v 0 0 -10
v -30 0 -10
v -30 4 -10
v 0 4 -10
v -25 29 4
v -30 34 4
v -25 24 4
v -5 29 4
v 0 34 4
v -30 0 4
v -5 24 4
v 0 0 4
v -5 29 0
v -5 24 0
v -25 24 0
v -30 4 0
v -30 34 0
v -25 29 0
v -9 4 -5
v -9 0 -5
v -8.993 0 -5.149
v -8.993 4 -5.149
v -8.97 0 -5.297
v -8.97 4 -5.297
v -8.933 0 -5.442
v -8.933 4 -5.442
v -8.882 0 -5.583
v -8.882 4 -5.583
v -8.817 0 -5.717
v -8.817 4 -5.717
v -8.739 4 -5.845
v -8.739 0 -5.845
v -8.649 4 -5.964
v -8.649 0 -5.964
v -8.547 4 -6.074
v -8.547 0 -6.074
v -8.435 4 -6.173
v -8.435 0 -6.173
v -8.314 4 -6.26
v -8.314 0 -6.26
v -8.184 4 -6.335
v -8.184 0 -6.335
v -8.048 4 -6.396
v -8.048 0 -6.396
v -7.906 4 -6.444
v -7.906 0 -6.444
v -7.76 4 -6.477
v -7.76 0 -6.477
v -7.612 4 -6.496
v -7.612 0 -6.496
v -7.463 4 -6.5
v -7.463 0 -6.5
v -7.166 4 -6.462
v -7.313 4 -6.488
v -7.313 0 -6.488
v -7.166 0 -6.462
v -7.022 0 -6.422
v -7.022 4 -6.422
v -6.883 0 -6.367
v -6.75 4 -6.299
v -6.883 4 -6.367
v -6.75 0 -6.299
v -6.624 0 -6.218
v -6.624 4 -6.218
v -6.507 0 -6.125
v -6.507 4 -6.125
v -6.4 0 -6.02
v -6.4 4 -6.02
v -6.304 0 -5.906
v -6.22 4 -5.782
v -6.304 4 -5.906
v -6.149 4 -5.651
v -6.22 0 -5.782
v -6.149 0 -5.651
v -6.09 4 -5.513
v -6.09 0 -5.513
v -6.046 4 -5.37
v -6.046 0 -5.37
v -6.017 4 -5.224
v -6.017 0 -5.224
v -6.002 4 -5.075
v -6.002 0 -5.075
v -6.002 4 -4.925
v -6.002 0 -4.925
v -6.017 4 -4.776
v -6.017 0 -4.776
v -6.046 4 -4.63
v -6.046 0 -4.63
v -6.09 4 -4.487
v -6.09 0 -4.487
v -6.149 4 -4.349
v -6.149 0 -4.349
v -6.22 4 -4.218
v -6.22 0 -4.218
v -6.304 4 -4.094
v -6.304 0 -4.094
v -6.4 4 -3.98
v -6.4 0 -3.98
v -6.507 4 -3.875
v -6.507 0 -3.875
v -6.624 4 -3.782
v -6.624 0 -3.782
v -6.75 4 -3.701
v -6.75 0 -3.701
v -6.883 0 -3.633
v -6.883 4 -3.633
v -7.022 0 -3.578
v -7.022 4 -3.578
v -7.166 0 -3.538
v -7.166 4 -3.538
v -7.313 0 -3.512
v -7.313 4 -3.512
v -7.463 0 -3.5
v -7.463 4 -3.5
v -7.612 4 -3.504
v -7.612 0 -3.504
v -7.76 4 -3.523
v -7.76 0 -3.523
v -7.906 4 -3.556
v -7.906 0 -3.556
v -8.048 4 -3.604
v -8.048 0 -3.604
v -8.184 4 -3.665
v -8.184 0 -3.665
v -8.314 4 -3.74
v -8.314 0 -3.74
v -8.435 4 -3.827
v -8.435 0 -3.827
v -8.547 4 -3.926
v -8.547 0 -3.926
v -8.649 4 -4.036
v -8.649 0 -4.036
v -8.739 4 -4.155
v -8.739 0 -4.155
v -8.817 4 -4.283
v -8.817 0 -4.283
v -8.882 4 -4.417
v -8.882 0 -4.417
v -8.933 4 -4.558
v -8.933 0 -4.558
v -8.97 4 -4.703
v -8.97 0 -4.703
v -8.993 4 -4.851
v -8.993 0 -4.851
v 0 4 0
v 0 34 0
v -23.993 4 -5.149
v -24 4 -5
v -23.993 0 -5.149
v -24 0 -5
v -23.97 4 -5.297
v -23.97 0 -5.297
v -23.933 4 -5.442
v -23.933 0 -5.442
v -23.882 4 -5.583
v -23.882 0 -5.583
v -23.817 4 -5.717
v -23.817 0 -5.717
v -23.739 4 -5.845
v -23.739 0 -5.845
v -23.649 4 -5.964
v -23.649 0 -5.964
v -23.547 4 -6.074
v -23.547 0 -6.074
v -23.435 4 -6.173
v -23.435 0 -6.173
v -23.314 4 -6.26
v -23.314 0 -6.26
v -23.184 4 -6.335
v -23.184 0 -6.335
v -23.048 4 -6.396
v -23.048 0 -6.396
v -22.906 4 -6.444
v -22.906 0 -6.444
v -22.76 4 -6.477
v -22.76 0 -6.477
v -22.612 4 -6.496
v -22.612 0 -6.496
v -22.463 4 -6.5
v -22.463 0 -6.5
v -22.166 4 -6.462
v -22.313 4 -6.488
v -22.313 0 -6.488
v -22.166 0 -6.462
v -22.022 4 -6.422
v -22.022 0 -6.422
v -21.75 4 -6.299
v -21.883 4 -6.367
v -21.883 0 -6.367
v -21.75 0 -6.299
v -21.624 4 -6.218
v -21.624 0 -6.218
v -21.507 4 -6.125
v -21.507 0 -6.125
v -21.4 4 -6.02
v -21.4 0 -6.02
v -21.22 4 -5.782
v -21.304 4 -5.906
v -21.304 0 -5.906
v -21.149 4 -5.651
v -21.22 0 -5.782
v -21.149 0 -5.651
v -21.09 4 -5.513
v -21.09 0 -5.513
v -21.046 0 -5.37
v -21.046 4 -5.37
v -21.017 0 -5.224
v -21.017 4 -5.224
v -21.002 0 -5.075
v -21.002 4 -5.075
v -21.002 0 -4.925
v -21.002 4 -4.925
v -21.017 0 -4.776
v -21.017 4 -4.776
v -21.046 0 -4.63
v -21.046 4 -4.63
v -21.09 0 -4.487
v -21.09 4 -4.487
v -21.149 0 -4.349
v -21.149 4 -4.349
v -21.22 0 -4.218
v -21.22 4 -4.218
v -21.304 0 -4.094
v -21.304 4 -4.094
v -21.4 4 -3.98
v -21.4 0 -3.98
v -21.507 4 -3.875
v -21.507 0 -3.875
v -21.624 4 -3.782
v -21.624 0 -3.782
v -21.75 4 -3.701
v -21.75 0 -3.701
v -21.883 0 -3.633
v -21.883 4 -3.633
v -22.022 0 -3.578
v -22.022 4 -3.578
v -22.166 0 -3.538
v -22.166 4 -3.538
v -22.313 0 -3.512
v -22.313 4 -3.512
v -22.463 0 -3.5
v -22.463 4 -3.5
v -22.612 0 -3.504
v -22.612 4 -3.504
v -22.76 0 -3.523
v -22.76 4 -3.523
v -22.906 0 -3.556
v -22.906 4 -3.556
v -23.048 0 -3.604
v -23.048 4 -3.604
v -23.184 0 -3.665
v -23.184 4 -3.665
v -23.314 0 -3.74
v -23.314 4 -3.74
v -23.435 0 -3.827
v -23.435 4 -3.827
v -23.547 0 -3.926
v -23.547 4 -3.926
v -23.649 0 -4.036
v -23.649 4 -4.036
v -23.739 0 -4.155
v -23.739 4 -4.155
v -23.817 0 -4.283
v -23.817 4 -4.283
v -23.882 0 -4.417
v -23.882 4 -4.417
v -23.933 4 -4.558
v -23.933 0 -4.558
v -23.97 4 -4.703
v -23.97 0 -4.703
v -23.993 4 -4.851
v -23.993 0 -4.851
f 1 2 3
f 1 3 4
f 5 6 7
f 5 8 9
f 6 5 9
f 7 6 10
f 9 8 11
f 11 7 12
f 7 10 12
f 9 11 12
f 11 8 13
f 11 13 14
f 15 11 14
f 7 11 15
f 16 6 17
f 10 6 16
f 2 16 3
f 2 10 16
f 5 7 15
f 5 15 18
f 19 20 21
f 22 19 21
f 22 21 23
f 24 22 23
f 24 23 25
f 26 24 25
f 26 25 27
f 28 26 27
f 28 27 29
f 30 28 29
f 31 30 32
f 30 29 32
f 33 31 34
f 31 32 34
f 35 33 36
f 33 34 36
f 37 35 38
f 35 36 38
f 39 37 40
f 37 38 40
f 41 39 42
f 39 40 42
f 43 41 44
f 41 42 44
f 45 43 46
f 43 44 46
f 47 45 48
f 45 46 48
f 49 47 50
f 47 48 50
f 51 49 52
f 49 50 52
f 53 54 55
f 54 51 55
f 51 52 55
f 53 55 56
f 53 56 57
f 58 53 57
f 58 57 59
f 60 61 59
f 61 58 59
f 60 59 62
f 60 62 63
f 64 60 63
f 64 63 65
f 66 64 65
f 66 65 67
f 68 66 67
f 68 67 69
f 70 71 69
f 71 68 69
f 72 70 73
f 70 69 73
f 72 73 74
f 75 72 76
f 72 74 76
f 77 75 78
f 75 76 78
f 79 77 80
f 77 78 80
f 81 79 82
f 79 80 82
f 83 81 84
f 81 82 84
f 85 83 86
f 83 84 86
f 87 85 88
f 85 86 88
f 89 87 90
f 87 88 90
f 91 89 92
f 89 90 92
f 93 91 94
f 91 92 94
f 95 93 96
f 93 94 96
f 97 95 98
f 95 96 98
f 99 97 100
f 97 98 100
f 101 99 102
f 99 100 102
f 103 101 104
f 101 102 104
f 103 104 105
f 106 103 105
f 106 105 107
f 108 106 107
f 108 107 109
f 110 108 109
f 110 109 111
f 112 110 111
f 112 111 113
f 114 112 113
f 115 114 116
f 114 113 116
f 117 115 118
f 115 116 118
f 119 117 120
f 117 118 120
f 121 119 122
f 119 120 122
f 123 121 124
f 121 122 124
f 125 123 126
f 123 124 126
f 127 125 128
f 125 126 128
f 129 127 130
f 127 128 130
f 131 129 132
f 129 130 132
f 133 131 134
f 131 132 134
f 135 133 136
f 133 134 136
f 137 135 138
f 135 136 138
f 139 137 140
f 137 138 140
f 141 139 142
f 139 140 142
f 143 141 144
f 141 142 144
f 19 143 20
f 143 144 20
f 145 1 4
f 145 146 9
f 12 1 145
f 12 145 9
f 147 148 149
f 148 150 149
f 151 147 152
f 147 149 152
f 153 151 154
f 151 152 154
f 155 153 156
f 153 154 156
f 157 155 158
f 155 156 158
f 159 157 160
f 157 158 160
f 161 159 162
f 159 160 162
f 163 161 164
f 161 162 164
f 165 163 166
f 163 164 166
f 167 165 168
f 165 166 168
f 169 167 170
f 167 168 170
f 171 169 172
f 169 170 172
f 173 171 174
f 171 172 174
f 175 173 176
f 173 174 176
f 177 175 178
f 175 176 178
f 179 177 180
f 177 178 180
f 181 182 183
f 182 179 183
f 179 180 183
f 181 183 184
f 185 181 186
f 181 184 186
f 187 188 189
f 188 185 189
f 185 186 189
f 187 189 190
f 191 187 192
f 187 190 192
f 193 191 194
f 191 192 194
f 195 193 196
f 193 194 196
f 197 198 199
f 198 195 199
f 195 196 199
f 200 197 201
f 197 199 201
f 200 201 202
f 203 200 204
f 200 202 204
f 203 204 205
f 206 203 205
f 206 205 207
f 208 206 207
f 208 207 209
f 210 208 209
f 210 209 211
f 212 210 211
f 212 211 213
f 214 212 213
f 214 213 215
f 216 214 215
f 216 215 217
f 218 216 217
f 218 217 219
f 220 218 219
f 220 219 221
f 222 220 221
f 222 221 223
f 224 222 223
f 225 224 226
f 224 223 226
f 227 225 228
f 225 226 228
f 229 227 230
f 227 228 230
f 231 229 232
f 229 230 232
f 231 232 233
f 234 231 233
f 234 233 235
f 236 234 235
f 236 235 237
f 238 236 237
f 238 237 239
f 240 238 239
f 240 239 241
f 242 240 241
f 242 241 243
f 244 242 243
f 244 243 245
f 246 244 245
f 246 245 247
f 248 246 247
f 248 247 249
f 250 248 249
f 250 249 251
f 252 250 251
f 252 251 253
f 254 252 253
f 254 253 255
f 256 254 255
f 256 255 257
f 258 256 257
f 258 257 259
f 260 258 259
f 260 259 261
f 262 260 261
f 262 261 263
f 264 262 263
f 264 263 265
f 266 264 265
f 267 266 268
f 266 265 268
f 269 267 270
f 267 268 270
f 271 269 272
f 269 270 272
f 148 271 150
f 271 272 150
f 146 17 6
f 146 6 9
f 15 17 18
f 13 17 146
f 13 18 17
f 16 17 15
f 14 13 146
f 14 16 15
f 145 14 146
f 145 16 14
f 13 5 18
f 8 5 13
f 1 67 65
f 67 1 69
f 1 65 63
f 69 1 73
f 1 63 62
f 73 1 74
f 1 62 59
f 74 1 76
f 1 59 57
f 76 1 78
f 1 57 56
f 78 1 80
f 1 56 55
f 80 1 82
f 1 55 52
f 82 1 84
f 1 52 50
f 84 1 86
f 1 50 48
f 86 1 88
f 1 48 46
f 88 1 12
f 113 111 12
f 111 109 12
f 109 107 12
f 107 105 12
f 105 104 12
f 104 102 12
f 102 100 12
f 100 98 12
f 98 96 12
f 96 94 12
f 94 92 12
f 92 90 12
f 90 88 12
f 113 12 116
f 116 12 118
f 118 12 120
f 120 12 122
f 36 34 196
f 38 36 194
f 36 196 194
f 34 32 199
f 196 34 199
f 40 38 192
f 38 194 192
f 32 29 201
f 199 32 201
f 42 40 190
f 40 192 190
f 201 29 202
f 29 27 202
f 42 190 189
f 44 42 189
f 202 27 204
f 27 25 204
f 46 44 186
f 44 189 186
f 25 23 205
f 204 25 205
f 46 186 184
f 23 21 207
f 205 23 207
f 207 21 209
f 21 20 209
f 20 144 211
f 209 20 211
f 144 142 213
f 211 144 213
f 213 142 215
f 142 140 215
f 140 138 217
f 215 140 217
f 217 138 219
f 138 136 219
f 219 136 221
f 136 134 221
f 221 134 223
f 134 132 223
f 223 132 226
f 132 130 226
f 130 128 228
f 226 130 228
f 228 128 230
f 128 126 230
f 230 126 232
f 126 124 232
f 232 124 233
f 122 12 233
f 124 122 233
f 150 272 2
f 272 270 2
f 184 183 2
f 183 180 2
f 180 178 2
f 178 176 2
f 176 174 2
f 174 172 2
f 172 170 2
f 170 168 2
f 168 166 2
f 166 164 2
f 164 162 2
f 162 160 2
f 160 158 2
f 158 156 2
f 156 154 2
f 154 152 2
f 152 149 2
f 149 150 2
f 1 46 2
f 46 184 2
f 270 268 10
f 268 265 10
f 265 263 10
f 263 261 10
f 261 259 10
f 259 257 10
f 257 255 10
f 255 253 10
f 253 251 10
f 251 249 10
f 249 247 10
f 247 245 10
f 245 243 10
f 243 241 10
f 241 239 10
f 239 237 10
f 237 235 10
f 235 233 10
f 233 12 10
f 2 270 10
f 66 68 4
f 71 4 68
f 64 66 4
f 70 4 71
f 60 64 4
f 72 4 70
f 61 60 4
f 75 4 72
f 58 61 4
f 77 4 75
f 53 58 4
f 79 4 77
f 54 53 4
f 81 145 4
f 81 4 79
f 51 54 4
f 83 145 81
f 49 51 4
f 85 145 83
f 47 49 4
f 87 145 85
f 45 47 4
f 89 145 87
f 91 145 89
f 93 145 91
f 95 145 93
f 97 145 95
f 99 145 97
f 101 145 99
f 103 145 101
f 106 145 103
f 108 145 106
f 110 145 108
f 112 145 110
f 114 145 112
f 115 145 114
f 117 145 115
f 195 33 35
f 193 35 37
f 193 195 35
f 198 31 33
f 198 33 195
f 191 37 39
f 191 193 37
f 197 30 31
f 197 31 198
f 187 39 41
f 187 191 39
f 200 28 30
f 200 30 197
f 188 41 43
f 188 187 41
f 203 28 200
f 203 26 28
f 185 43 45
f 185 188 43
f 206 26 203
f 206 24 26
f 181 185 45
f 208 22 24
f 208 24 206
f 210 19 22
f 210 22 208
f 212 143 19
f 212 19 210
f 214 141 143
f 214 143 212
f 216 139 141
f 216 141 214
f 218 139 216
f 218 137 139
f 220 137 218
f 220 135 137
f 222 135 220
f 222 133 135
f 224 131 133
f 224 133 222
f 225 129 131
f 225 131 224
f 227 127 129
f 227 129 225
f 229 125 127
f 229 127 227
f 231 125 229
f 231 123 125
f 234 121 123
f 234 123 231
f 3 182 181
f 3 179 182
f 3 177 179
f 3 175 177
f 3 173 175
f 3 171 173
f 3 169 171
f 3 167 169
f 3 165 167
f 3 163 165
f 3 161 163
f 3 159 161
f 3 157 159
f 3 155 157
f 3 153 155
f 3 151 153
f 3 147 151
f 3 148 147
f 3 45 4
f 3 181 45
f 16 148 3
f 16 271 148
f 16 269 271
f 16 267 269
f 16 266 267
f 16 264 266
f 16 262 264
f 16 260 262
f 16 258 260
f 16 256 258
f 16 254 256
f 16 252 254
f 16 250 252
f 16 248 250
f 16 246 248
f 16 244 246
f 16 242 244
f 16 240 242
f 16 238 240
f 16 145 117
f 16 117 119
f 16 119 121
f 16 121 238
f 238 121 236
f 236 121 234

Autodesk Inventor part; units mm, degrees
ref_plane "YZ Plane" through (0, 0, 0) normal (1, 0, 0) x (0, 1, 0)
ref_plane "XZ Plane" through (0, 0, 0) normal (0, 1, 0) x (-1, 0, 0)
ref_plane "XY Plane" through (0, 0, 0) normal (0, 0, 1) x (1, 0, 0)
sketch "Sketch1" plane through (0, 0, 0) normal (0, 1, 0) x (-1, 0, 0)
  line L0 (0, 0) -> (30, 0)
  line L1 (30, 0) -> (30, -10)
  line L2 (30, -10) -> (0, -10)
  line L3 (0, -10) -> (0, 0)
  circle A0 centre (22.5, -5) radius 1.5
  circle A1 centre (7.5, -5) radius 1.5
  dimension "d0" = 3
  dimension "d1" = 3
  dimension "d2" = 30
  dimension "d3" = 15
  dimension "d4" = 5
  dimension "d5" = 10
  dimension "d6" = 7.5
extrude "Extrusion1" add sketch "Sketch1" along normal blind 4
sketch "Sketch2" plane through (0, 4, 0) normal (0, 1, 0) x (1, 0, 0)
  line L0 (-30, 0) -> (0, 0) projected
  line L1 (0, 0) -> (-30, 0)
  line L2 (-30, 0) -> (-30, -4)
  line L3 (-30, -4) -> (0, -4)
  line L4 (0, -4) -> (0, 0)
  point P0 (-30, 0)
  dimension "d9" = 4
extrude "Extrusion2" add sketch "Sketch2" along normal blind 30 and the other way blind 4
sketch "Sketch3" plane through (-30, 34, 4) normal (0, 0, 1) x (1, 0, 0)
  line L0 (5, -5) -> (25, -5)
  line L1 (25, -5) -> (25, -10)
  line L2 (25, -10) -> (5, -10)
  line L3 (5, -10) -> (5, -5)
  line L4 (0, -34) -> (0, 0) projected
  line L5 (0, 0) -> (30, 0) projected
  point P0 (30, -34)
  dimension "d14" = 20
  dimension "d15" = 5
  dimension "d16" = 5
  dimension "d19" = 5
extrude "Extrusion3" cut sketch "Sketch3" against normal blind 30
properties part number "BatteryMount"
